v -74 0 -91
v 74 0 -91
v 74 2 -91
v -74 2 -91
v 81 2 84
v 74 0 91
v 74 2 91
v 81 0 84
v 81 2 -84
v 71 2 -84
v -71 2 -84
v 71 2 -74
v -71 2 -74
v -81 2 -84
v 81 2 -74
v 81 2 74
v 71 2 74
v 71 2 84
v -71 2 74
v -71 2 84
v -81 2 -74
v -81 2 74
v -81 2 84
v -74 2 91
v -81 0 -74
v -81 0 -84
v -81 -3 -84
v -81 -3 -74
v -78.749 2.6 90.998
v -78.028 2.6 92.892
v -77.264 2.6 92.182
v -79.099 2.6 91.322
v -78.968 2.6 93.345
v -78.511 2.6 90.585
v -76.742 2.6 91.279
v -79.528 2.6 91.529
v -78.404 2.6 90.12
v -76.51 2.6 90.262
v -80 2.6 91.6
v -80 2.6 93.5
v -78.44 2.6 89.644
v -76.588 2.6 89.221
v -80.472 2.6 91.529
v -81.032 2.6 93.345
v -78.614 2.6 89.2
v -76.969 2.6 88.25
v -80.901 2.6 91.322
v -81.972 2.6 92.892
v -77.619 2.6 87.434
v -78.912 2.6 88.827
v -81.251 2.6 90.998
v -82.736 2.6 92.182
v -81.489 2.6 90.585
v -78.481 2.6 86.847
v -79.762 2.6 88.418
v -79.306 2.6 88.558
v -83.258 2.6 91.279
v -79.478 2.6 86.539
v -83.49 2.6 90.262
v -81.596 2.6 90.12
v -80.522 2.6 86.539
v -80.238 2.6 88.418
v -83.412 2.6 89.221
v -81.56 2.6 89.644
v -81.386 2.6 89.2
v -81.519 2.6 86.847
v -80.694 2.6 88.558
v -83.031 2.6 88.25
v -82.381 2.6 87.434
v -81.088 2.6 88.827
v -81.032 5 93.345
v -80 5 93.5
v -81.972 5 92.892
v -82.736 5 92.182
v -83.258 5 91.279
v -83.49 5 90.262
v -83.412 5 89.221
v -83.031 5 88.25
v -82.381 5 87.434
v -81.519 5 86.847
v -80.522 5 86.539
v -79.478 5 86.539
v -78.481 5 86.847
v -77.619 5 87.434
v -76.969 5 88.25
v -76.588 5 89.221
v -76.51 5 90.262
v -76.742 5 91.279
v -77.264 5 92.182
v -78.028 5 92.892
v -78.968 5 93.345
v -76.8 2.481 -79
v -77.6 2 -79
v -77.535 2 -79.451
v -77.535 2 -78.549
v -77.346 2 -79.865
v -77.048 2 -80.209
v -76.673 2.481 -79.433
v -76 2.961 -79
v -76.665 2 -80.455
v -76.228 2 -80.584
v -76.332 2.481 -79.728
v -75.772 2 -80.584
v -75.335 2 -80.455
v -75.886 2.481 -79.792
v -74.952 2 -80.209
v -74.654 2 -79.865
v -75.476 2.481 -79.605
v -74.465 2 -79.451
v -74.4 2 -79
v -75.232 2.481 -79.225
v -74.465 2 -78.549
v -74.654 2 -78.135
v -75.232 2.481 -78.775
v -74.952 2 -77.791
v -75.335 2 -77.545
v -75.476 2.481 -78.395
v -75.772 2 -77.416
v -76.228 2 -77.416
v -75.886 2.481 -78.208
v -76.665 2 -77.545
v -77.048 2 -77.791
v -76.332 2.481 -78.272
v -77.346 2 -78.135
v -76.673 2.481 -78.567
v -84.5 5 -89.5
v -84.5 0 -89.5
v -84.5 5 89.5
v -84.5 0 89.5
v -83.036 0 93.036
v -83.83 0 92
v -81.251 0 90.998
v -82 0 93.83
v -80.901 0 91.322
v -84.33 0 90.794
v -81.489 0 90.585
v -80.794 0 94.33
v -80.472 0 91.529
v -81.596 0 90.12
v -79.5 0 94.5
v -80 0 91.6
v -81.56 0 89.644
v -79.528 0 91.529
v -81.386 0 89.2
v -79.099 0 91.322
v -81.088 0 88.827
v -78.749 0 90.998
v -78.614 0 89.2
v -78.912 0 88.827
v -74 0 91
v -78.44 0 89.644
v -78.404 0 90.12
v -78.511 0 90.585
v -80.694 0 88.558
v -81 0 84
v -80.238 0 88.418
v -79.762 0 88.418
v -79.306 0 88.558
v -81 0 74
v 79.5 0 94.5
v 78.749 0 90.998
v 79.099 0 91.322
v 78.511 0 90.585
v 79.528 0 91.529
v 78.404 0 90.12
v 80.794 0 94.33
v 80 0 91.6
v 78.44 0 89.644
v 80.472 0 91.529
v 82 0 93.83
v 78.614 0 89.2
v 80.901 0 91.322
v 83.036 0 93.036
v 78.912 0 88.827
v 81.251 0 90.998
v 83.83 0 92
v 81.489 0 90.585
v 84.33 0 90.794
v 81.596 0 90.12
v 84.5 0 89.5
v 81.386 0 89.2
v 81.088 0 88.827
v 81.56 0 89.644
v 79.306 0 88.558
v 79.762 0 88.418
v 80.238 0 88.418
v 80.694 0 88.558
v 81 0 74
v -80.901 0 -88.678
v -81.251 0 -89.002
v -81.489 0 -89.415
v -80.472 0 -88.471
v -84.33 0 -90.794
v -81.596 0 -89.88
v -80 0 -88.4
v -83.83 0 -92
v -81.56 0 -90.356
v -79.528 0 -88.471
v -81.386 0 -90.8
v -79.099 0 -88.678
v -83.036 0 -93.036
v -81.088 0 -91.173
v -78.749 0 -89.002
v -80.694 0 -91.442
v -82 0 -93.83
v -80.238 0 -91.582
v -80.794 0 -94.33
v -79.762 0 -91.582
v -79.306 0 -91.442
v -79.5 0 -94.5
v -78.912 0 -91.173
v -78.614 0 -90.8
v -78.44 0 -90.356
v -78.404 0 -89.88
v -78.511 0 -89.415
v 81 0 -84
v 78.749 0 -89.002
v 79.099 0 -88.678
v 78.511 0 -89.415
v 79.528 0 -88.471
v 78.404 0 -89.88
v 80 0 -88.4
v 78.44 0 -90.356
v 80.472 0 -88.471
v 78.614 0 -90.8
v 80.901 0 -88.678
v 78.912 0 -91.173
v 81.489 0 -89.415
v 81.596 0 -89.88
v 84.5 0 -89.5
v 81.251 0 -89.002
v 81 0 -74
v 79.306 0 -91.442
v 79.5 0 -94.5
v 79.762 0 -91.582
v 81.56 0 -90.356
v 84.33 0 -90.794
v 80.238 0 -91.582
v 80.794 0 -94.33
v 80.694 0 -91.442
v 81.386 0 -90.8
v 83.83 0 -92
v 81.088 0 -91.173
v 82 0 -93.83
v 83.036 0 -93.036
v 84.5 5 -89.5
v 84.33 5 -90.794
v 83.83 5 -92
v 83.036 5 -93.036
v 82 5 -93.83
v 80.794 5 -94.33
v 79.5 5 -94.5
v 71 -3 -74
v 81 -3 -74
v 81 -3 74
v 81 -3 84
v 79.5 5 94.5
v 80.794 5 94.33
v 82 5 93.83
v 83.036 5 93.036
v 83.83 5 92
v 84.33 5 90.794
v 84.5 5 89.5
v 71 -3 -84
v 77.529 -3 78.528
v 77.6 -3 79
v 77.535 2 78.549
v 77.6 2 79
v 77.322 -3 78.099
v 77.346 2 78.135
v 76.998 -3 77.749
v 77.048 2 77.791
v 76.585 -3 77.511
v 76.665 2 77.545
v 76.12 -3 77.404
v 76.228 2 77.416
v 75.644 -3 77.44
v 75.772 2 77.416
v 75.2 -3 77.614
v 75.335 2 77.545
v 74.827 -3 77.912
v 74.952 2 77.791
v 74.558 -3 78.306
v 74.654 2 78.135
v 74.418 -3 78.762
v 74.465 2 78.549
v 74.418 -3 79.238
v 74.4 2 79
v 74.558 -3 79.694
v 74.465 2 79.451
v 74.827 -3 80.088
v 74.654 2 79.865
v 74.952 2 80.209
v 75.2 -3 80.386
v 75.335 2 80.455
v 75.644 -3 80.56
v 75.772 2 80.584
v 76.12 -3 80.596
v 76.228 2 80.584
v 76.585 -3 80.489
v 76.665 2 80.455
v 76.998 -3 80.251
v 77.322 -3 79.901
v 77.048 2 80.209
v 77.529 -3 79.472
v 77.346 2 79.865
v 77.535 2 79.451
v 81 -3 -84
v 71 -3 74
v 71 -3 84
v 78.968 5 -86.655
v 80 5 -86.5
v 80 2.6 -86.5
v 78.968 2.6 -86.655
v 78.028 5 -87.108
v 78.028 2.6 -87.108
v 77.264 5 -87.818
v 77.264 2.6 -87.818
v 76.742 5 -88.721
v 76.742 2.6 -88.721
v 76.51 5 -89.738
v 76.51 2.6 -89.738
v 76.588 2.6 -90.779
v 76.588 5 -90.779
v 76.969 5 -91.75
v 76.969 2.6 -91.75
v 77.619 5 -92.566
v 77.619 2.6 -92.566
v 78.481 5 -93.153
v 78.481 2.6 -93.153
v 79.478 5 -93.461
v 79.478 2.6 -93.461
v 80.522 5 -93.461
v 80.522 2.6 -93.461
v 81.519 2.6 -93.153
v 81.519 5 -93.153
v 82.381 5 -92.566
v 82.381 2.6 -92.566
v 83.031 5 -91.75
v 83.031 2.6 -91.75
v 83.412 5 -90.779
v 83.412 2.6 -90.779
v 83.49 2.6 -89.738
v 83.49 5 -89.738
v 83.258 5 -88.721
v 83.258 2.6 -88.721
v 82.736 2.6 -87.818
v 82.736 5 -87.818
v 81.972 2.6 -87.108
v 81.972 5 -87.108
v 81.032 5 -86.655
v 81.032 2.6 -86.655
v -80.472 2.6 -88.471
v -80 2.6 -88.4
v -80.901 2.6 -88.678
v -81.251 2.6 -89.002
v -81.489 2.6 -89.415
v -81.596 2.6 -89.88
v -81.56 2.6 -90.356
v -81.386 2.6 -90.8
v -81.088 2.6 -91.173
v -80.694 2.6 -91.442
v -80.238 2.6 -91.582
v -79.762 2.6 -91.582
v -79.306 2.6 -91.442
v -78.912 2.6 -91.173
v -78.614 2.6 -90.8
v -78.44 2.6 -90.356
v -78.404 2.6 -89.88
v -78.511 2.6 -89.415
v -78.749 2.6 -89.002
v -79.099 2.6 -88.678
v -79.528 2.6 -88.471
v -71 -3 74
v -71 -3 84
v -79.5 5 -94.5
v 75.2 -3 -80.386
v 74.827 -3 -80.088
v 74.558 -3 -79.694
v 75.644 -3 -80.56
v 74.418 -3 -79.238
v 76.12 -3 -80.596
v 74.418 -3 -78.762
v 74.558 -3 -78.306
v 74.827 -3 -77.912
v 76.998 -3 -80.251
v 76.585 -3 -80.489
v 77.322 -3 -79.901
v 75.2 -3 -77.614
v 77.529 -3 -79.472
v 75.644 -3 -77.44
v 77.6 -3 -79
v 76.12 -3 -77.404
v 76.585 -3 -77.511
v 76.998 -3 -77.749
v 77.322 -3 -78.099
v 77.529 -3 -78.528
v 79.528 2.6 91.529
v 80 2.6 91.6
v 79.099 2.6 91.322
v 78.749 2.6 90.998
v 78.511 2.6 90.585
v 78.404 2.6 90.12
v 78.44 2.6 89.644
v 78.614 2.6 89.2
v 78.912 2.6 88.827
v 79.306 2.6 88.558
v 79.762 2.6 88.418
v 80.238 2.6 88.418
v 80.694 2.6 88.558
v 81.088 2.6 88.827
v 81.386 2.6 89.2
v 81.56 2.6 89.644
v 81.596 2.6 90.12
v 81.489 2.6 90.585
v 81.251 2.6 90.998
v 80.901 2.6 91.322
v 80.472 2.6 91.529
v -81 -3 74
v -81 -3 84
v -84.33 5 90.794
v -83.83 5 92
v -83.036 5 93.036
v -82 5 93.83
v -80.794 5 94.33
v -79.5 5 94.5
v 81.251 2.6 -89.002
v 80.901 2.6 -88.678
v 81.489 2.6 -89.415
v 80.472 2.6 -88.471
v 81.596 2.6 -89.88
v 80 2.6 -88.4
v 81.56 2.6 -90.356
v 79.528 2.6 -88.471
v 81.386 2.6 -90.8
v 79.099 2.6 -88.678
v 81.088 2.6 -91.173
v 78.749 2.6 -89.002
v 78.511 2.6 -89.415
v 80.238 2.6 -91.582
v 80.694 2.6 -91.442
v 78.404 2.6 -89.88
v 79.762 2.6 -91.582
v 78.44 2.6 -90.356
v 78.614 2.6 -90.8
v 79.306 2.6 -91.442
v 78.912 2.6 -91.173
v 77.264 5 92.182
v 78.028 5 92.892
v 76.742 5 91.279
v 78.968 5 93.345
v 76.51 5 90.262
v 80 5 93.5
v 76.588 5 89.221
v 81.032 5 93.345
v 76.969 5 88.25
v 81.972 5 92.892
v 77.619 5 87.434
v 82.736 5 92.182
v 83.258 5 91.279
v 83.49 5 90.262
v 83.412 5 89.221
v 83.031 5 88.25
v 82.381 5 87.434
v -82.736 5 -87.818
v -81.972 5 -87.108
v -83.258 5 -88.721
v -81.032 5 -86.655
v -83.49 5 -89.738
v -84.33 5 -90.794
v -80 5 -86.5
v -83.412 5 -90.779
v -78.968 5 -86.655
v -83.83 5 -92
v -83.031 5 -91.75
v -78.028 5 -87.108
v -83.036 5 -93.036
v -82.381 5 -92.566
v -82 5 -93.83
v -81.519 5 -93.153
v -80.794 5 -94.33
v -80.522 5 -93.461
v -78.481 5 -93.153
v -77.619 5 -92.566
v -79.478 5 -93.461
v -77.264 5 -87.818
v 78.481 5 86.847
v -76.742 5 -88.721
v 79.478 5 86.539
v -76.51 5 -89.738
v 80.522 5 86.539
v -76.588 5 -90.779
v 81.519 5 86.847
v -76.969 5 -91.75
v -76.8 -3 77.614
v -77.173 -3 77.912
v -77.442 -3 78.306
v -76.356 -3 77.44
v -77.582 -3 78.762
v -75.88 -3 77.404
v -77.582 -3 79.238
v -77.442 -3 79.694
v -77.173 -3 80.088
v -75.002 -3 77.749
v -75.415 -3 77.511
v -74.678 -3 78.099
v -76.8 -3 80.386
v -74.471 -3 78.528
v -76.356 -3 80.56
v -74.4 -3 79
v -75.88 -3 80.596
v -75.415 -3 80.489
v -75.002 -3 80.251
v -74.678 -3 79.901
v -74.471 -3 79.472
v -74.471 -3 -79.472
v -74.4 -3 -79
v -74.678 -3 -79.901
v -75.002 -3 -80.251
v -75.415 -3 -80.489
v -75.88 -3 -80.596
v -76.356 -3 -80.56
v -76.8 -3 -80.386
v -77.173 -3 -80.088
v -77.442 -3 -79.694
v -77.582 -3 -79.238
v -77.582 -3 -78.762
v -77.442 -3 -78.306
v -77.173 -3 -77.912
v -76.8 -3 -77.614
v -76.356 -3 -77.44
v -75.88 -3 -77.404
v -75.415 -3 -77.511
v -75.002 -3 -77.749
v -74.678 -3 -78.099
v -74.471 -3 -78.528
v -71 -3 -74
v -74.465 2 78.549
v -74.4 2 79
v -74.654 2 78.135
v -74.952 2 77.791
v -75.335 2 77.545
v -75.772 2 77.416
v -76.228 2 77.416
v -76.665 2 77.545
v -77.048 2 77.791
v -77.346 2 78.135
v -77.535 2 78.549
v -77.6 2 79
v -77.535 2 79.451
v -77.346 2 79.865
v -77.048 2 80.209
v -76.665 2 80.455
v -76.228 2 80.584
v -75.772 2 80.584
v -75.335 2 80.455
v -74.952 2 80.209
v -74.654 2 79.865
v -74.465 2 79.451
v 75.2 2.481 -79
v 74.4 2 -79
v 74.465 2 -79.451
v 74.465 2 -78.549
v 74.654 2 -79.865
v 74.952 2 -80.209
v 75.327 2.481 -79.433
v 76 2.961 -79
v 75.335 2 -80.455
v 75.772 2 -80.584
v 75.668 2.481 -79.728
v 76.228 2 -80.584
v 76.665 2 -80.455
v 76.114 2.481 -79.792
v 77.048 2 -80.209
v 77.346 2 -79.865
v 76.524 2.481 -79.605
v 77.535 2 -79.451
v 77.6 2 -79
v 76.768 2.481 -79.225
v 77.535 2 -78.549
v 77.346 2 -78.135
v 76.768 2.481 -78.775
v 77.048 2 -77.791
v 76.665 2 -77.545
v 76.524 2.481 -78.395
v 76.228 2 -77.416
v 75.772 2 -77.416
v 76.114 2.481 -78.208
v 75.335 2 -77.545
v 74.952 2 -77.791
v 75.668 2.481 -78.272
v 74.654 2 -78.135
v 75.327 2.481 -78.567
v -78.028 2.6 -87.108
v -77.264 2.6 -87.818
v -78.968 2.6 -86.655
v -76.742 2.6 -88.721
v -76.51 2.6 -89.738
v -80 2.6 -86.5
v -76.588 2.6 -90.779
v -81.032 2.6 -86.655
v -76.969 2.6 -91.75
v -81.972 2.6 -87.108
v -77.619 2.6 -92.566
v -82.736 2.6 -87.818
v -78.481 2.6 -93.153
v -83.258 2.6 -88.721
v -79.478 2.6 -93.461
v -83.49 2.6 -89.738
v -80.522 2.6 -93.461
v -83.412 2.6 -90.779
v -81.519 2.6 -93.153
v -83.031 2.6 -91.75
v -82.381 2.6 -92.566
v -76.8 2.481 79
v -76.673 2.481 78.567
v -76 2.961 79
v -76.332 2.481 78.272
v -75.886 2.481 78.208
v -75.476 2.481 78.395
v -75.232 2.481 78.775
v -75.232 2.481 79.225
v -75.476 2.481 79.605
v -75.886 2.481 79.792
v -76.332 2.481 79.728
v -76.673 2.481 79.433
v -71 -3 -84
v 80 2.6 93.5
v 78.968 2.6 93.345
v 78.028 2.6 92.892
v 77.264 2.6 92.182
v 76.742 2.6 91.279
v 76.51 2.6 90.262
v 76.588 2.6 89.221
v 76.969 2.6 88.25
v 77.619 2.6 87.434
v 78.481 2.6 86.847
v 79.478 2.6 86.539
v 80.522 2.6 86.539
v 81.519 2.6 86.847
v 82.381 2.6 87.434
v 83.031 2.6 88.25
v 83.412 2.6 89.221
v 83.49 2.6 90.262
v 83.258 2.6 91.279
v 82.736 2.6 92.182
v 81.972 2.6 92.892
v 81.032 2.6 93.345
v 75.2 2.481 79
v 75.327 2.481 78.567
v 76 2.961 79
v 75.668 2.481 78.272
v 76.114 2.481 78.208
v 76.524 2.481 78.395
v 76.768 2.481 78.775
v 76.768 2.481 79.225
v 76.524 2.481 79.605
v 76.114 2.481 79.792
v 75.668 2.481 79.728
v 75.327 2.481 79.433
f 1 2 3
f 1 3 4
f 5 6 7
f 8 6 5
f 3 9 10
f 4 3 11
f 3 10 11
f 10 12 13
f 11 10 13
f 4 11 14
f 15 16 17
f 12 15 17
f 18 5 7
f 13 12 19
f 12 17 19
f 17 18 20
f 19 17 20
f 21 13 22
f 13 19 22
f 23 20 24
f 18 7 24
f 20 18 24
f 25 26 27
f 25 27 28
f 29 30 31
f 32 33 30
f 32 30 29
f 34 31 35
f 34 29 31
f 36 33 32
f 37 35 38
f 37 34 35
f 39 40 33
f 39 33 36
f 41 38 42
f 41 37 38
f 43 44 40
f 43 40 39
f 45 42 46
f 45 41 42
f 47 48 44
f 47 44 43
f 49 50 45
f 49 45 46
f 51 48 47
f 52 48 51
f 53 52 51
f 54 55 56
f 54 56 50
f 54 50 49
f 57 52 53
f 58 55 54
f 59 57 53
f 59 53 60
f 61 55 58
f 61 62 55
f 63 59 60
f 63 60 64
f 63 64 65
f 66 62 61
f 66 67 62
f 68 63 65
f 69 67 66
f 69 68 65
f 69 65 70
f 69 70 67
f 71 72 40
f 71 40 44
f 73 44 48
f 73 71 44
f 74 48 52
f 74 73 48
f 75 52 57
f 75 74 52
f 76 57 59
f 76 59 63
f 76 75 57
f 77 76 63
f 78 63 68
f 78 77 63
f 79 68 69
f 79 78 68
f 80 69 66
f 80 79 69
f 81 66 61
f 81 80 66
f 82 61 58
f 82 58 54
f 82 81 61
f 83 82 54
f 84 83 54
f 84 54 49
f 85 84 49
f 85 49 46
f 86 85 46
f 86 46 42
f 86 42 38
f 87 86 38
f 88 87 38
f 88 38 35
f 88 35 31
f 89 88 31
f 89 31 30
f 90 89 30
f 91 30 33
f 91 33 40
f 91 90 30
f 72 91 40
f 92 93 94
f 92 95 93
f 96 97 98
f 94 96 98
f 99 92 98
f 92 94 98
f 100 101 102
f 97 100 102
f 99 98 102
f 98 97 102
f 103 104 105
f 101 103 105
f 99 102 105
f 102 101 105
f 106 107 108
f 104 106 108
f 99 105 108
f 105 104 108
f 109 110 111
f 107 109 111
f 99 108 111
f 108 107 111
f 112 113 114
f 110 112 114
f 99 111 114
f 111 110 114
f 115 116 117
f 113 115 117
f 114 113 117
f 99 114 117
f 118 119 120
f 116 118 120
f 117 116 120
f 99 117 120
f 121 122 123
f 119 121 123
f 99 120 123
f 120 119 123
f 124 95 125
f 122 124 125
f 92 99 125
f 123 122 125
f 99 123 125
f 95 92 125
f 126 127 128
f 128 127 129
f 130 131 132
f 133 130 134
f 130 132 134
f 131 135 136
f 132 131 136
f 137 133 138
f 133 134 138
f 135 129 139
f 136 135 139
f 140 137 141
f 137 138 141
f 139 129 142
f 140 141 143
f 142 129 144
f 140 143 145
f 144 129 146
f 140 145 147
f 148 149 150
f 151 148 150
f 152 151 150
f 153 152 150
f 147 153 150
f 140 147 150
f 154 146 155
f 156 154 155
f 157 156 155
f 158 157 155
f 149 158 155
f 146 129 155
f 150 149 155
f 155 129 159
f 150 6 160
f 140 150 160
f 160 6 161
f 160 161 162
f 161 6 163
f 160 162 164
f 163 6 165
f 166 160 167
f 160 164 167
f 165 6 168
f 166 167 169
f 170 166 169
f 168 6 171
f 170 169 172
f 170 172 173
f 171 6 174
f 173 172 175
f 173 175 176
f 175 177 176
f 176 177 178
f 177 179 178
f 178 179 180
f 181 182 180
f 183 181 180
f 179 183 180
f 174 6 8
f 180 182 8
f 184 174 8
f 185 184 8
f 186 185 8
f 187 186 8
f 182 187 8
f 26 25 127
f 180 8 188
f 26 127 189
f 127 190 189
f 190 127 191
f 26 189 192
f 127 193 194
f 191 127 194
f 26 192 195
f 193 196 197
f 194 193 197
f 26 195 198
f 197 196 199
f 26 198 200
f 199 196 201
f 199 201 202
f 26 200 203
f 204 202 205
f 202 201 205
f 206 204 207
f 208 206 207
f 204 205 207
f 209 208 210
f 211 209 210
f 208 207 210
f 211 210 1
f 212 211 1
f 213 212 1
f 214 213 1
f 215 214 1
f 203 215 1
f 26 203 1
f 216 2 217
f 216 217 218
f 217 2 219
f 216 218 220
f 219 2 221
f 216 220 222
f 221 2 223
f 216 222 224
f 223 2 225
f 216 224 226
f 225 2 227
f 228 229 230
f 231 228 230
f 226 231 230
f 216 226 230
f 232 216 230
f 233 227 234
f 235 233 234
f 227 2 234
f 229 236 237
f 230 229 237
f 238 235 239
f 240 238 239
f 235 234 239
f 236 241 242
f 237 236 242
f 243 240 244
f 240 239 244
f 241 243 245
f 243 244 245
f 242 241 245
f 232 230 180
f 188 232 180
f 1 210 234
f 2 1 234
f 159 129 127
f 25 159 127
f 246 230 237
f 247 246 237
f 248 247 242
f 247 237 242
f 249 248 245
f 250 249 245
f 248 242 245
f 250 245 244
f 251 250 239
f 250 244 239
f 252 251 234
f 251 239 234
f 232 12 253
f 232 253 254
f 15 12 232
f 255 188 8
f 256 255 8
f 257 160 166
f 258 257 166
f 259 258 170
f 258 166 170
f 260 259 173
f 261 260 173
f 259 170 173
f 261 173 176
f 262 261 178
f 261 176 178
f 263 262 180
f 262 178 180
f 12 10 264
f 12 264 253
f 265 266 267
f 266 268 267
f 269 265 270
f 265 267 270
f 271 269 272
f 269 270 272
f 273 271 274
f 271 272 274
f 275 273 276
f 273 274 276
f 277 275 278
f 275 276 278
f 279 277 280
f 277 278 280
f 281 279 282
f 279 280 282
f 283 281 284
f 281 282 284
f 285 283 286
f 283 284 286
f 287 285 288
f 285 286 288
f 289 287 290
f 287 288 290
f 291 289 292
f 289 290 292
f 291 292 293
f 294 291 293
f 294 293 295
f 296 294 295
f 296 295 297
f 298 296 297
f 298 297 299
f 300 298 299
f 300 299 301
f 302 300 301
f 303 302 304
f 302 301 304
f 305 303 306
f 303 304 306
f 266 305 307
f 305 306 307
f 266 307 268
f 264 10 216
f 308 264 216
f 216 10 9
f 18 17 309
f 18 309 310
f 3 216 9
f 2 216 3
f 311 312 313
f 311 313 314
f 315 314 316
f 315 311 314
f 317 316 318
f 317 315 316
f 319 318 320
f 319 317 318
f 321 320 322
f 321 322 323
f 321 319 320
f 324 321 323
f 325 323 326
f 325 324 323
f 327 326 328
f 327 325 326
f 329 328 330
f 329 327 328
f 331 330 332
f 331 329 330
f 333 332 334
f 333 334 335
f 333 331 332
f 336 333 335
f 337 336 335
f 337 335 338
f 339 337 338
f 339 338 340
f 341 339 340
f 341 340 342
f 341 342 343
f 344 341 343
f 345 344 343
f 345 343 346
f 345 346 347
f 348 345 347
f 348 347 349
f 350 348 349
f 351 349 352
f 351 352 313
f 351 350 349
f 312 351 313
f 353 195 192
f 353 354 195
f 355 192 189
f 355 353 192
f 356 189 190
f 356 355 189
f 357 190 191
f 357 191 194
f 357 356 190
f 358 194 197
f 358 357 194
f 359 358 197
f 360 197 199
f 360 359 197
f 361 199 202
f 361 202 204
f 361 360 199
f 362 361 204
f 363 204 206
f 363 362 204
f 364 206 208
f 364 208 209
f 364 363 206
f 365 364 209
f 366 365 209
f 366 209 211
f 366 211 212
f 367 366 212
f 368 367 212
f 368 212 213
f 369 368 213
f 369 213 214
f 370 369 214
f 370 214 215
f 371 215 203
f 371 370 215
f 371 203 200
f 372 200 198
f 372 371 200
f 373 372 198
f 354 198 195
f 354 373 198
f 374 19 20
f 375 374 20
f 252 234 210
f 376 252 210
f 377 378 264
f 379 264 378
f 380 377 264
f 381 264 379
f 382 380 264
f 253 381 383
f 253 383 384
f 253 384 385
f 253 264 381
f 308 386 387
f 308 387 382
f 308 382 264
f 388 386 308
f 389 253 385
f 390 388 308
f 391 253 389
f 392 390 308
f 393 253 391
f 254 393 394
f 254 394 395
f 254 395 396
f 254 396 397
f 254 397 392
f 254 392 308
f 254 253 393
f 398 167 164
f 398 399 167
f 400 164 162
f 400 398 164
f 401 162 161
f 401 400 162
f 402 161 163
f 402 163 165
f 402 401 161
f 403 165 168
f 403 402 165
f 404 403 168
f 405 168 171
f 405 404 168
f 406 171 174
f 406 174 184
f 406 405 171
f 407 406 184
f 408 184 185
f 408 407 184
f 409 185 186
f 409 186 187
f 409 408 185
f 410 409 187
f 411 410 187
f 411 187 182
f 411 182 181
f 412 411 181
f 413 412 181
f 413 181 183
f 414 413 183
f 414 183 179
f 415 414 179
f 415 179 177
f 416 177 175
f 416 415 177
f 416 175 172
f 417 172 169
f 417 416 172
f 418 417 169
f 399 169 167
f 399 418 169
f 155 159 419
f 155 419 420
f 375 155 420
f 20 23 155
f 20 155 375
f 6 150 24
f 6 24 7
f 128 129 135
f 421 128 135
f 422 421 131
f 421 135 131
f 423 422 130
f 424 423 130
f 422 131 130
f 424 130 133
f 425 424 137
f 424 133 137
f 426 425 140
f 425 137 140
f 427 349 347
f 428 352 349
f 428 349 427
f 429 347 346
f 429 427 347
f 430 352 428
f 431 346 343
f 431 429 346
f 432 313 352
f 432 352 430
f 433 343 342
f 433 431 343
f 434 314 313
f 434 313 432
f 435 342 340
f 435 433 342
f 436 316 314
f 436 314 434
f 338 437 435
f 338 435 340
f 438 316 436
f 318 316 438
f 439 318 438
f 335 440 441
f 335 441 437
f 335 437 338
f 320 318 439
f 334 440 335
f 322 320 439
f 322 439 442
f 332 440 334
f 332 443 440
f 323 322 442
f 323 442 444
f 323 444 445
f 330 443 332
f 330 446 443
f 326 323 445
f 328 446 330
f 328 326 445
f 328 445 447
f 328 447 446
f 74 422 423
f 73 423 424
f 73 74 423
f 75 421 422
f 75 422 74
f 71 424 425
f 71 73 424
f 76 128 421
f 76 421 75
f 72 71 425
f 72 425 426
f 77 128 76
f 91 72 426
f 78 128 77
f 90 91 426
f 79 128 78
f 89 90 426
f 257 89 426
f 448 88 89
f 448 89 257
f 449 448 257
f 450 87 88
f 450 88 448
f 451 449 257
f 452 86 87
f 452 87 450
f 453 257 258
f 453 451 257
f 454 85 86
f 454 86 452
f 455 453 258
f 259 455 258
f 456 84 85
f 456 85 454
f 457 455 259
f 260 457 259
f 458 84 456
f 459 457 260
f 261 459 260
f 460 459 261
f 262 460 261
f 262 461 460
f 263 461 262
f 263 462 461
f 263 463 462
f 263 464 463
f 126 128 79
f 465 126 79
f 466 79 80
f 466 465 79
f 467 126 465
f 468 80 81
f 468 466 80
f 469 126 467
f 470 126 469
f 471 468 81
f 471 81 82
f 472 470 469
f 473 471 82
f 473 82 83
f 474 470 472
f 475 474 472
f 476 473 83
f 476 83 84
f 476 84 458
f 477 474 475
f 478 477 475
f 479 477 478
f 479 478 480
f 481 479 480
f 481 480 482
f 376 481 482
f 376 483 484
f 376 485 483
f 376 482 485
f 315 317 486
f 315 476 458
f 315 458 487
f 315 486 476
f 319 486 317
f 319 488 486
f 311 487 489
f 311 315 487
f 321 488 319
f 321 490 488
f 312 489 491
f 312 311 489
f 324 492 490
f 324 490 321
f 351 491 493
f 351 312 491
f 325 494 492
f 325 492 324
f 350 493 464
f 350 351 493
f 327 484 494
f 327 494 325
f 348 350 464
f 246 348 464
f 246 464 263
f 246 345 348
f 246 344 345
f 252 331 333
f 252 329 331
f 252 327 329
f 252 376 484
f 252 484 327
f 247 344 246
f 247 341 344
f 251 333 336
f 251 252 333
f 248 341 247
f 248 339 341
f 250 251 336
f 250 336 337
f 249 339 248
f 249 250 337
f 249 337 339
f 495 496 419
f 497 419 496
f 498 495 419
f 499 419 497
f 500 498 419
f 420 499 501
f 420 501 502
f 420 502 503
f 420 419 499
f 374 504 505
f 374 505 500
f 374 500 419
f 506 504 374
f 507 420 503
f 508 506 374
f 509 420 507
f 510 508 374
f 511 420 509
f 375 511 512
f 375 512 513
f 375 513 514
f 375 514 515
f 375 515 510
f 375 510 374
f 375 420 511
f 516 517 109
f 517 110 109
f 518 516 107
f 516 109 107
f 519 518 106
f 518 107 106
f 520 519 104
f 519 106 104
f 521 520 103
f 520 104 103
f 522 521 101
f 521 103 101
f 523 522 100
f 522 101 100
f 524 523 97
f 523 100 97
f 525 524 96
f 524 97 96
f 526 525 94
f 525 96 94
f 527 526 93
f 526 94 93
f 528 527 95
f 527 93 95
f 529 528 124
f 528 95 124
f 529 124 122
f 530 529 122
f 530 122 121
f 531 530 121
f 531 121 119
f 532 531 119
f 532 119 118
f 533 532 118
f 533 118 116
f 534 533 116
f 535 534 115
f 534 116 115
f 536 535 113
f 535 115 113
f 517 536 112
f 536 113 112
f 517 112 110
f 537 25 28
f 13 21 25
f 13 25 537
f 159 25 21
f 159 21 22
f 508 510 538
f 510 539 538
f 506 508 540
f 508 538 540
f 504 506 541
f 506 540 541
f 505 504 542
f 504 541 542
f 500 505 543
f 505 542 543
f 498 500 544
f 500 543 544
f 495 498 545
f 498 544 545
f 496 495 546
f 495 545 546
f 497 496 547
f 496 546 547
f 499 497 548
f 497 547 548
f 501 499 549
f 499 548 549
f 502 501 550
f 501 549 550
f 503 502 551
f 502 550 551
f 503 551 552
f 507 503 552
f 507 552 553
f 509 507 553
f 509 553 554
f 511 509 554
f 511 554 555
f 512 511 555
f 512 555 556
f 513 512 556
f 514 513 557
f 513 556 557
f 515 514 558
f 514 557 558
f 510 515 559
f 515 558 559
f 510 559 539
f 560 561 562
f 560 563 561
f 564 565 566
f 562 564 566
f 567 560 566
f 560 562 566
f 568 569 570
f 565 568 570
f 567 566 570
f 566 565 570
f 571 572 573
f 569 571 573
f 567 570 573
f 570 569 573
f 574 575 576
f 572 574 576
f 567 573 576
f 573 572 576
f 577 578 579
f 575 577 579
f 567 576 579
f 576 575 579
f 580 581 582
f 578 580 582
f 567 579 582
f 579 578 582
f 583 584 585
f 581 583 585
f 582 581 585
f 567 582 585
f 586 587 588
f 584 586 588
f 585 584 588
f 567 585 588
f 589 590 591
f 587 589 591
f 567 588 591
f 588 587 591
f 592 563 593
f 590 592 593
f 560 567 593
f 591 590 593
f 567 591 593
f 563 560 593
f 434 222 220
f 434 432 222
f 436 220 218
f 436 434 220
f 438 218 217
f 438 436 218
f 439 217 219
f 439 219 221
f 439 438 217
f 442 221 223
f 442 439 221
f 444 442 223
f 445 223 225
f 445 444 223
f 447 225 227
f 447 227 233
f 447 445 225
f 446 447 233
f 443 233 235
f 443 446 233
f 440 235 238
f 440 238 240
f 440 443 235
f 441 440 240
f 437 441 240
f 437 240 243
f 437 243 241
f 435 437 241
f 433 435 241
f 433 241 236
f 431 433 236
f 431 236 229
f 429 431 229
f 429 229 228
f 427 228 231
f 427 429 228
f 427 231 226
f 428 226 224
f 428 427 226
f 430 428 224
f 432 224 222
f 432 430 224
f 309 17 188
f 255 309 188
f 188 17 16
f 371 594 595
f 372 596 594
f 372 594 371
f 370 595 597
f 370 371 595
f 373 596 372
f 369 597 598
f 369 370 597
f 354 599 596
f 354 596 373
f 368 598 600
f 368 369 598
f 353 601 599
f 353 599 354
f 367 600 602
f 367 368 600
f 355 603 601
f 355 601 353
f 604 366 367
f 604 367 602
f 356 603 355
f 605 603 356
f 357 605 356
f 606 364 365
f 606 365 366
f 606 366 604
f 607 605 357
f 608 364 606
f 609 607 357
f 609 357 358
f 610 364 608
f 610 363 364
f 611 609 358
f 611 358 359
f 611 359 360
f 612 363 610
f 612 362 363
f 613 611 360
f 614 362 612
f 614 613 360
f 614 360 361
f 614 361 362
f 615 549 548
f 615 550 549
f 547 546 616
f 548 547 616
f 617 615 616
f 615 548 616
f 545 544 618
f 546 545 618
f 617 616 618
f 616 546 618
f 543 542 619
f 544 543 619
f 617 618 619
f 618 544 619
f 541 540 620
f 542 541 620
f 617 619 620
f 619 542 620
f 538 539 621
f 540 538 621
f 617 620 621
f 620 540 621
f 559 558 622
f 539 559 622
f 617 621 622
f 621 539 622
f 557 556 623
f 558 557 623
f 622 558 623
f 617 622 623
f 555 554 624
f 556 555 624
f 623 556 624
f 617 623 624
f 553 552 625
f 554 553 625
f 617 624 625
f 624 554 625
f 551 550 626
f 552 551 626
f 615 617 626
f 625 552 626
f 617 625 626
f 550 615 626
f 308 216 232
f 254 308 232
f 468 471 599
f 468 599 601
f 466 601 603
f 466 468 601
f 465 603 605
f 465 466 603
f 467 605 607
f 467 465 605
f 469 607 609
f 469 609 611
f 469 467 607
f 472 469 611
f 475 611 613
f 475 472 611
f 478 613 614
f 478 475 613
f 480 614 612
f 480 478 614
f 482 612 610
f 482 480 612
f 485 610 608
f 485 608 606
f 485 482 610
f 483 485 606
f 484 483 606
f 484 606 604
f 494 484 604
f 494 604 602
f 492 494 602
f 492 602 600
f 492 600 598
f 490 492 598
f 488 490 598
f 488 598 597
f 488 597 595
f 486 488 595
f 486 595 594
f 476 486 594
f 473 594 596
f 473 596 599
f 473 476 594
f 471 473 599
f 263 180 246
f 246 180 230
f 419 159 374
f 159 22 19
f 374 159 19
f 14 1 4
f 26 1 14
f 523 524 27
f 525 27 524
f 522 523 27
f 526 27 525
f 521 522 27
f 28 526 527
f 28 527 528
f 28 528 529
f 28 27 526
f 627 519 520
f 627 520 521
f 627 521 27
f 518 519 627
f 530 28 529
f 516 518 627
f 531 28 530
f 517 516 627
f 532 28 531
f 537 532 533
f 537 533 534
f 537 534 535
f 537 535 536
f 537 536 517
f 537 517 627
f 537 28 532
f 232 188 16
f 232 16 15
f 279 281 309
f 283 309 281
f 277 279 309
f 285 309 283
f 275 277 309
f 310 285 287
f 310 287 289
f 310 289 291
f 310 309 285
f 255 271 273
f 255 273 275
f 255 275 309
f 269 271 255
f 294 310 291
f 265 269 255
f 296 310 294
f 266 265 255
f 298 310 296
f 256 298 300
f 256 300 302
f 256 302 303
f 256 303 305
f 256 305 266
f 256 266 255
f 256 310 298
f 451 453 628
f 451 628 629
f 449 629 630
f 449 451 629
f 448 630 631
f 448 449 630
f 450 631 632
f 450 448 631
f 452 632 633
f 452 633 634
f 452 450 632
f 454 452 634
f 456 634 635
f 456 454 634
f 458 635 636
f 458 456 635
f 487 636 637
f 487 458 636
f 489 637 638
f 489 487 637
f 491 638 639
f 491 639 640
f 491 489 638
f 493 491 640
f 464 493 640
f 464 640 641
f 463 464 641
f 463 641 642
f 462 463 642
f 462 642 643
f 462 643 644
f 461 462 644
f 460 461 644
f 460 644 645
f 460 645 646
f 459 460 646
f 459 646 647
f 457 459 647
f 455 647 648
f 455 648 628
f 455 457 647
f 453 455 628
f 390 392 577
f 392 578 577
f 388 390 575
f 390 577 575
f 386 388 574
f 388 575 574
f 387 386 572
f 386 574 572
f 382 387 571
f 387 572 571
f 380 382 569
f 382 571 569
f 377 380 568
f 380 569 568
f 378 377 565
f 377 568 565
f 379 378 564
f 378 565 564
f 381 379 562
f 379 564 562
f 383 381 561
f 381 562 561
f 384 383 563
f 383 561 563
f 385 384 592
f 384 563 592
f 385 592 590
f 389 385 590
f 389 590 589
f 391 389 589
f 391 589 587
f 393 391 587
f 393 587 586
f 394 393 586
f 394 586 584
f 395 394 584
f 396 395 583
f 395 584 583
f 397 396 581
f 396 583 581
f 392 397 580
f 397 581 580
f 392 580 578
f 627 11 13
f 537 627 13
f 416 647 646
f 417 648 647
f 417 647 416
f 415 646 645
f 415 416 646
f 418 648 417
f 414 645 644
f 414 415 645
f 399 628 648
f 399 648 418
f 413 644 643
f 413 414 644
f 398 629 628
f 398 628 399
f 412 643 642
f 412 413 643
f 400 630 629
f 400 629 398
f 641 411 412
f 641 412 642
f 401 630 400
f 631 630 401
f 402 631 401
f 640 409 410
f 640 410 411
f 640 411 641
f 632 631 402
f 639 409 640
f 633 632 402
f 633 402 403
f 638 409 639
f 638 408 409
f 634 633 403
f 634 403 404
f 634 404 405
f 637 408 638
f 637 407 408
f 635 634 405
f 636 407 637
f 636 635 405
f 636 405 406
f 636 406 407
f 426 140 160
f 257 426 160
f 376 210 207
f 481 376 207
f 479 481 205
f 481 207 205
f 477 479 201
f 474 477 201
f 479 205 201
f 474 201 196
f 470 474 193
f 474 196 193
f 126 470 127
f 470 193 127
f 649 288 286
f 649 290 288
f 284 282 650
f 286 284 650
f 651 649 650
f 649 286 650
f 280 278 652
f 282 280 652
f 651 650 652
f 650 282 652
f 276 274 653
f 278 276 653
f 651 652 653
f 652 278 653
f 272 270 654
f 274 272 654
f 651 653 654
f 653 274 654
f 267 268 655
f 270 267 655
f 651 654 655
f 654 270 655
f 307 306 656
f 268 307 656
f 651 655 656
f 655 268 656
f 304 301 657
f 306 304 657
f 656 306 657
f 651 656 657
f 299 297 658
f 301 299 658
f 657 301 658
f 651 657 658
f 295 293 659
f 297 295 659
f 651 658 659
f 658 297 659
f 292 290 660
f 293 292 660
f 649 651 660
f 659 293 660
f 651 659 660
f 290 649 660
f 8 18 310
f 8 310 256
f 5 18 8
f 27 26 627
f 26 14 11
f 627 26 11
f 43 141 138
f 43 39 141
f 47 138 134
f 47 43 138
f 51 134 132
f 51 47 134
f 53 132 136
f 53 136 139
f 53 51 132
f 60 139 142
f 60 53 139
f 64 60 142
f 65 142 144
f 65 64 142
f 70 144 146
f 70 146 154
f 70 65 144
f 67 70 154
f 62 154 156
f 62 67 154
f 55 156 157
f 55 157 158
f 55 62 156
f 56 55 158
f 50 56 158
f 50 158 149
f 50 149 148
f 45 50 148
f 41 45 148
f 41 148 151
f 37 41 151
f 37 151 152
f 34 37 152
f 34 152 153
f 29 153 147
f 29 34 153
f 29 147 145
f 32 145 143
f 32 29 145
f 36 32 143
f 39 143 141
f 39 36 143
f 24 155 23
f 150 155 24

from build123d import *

# Parameters (mm, degrees)
SALIENTE_EXTRUIR2_DEPTH                     = 5
REFRENTADO_PARA_TORNILLO_CON_CABEZA_2_COUNT = 2
REFRENTADO_PARA_TORNILLO_CON_CABEZA_2_PITCH = 180
REFRENTADO_PARA_TORNILLO_CON_CABEZA_3_COUNT = 2
REFRENTADO_PARA_TORNILLO_CON_CABEZA_3_PITCH = 240.831891576
REFRENTADO_PARA_TORNILLO_CON_CABEZA_4_COUNT = 2
REFRENTADO_PARA_TORNILLO_CON_CABEZA_4_PITCH = 160
CORTAR_EXTRUIR1_DEPTH                       = 2
CROQUIS8_W                                  = 10
CROQUIS8_H                                  = 10
SALIENTE_EXTRUIR7_DEPTH                     = 5
TALADRO_DE_MARGEN_PARA_M31_D                = 3.2
TALADRO_DE_MARGEN_PARA_M31_DEPTH            = 5
TALADRO_DE_MARGEN_PARA_M31_TIP              = 0.96137699


with BuildPart() as part:
    # Croquis1 → Saliente-Extruir2 (new body)
    with BuildSketch(Plane(origin=(0, 0, 0), x_dir=(1, 0, 0), z_dir=(0, 1, 0))):
        with BuildLine():
            Line((-79.5, -94.5), (79.5, -94.5))
            ThreePointArc((79.5, -94.5), (83.035533906, -93.035533906), (84.5, -89.5))
            Line((84.5, -89.5), (84.5, 89.5))
            ThreePointArc((84.5, 89.5), (83.035533906, 93.035533906), (79.5, 94.5))
            Line((79.5, 94.5), (-79.5, 94.5))
            ThreePointArc((-79.5, 94.5), (-83.035533906, 93.035533906), (-84.5, 89.5))
            Line((-84.5, 89.5), (-84.5, -89.5))
            ThreePointArc((-84.5, -89.5), (-83.035533906, -93.035533906), (-79.5, -94.5))
        make_face()
    extrude(amount=SALIENTE_EXTRUIR2_DEPTH)

    # Croquis5 → Refrentado para tornillo con cabeza troncocónica de M31 (revolve, cut)
    with BuildSketch(Plane(origin=(80, 5, -90), x_dir=(0, 0, 1), z_dir=(1, 0, 0))):
        Polygon((0, 0), (0, 5), (1.6, 5), (1.6, 2.4), (3.5, 2.4), (3.5, -2), (1.5, 0), align=None)
    refrentado_para_tornillo_con_cabeza_tron = revolve(axis=Axis((80, 11.35, -90), (0, -1, 0)), mode=Mode.SUBTRACT)

    # Refrentado para tornillo con cabeza  2: Refrentado para tornillo con cabeza troncocónica de M31 ×2
    with Locations(*[(0, 0, i * REFRENTADO_PARA_TORNILLO_CON_CABEZA_2_PITCH) for i in range(1, REFRENTADO_PARA_TORNILLO_CON_CABEZA_2_COUNT)]):
        add(refrentado_para_tornillo_con_cabeza_tron, mode=Mode.SUBTRACT)

    # Refrentado para tornillo con cabeza  3: Refrentado para tornillo con cabeza troncocónica de M31 ×2
    with Locations(*[Vector(-0.664363839, 0, 0.747409319) * (i * REFRENTADO_PARA_TORNILLO_CON_CABEZA_3_PITCH) for i in range(1, REFRENTADO_PARA_TORNILLO_CON_CABEZA_3_COUNT)]):
        add(refrentado_para_tornillo_con_cabeza_tron, mode=Mode.SUBTRACT)

    # Refrentado para tornillo con cabeza  4: Refrentado para tornillo con cabeza troncocónica de M31 ×2
    with Locations(*[(-i * REFRENTADO_PARA_TORNILLO_CON_CABEZA_4_PITCH, 0, 0) for i in range(1, REFRENTADO_PARA_TORNILLO_CON_CABEZA_4_COUNT)]):
        add(refrentado_para_tornillo_con_cabeza_tron, mode=Mode.SUBTRACT)

    # Croquis6 → Cortar-Extruir1 (cut)
    with BuildSketch(Plane.XZ):
        Polygon((-81, 84), (-74, 91), (74, 91), (81, 84), (81, -84), (74, -91), (-74, -91), (-81, -84), align=None)
    extrude(amount=-CORTAR_EXTRUIR1_DEPTH, mode=Mode.SUBTRACT)

    # Croquis8 → Saliente-Extruir7 (add)
    with BuildSketch(Plane.XZ.offset(-2)):
        with Locations((-76, 79)):
            Rectangle(CROQUIS8_W, CROQUIS8_H)
        with Locations((76, 79)):
            Rectangle(CROQUIS8_W, CROQUIS8_H)
        with Locations((-76, -79)):
            Rectangle(CROQUIS8_W, CROQUIS8_H)
        with Locations((76, -79)):
            Rectangle(CROQUIS8_W, CROQUIS8_H)
    extrude(amount=SALIENTE_EXTRUIR7_DEPTH)

    # Taladro de margen para M31
    with Locations(Plane(origin=(0, -3, 0), x_dir=(-1, 0, 0), z_dir=(0, -1, 0))):
        with Locations((-76, 79), (76, 79), (76, -79), (-76, -79)):
            Hole(TALADRO_DE_MARGEN_PARA_M31_D / 2, depth=TALADRO_DE_MARGEN_PARA_M31_DEPTH)
            with Locations((0, 0, -(TALADRO_DE_MARGEN_PARA_M31_DEPTH + TALADRO_DE_MARGEN_PARA_M31_TIP / 2))):  # 118° drill point
                Cone(0, TALADRO_DE_MARGEN_PARA_M31_D / 2, TALADRO_DE_MARGEN_PARA_M31_TIP, mode=Mode.SUBTRACT)


solid = part.part
